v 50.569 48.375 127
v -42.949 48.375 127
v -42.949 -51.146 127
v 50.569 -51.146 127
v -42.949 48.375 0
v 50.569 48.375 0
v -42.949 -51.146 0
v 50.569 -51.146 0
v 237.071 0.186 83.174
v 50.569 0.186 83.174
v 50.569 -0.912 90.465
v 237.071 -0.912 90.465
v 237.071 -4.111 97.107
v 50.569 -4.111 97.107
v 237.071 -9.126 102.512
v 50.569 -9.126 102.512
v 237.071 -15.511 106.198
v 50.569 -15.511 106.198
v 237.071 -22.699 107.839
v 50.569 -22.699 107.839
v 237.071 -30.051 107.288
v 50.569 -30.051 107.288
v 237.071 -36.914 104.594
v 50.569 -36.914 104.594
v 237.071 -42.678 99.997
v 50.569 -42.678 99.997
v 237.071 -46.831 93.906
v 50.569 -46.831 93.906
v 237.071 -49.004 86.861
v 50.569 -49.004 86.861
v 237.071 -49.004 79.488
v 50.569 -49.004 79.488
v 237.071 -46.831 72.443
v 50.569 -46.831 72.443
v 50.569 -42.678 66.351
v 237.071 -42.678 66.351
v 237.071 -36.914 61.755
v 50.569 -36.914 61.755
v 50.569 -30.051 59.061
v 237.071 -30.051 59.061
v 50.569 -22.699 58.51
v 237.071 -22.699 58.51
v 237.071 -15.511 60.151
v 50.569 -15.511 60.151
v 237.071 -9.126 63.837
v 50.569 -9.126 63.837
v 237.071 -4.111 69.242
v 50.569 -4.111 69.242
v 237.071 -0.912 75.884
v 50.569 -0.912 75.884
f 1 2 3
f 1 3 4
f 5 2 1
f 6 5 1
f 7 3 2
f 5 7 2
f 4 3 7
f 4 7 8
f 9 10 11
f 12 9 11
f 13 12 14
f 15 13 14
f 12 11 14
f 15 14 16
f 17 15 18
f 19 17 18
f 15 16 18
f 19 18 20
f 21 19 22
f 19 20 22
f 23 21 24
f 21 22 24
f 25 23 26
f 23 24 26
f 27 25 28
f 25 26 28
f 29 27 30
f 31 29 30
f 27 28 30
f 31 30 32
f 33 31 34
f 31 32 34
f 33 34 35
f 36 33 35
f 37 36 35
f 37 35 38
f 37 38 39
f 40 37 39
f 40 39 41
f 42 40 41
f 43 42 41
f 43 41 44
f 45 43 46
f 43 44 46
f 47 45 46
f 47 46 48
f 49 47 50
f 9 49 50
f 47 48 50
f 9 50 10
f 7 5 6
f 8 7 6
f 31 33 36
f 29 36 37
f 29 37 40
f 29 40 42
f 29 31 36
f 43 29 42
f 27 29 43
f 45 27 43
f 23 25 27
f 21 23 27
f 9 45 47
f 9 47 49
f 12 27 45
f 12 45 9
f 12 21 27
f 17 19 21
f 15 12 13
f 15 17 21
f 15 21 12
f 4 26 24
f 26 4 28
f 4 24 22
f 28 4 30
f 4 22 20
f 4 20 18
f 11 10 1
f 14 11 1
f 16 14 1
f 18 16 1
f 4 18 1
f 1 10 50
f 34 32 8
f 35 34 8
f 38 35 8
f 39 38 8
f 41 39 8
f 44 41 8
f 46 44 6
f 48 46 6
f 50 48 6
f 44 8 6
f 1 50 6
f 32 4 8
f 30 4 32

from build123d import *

# Parameters (mm, degrees)
F0_W          = 93.5181863606
F0_H          = 99.5218157768
F1_DEPTH      = 127
F2_R          = 24.7334517627
F3_DEPTH      = 186.5019382
F3_DEPTH_BACK = 41.98141


# Not quite as in the source:
# - an extrude ends at something that could not be found from the text; its depth is read off the source's solid


with BuildPart() as f1:
    # F0 (on Top) → F1 (new body)
    with BuildSketch(Plane.XY):
        with Locations((3.8100015372, -1.3854540884)):
            Rectangle(F0_W, F0_H)
    extrude(amount=F1_DEPTH)

    # F2 (on face) → F3 (join, two sides)
    with BuildSketch(Plane.YZ.offset(50.5690947175)) as f3_sk:
        with Locations((-24.546951997, 83.1744330844)):
            Circle(F2_R)
    extrude(amount=F3_DEPTH)
    extrude(f3_sk.sketch, amount=-F3_DEPTH_BACK)


solid = f1.part
